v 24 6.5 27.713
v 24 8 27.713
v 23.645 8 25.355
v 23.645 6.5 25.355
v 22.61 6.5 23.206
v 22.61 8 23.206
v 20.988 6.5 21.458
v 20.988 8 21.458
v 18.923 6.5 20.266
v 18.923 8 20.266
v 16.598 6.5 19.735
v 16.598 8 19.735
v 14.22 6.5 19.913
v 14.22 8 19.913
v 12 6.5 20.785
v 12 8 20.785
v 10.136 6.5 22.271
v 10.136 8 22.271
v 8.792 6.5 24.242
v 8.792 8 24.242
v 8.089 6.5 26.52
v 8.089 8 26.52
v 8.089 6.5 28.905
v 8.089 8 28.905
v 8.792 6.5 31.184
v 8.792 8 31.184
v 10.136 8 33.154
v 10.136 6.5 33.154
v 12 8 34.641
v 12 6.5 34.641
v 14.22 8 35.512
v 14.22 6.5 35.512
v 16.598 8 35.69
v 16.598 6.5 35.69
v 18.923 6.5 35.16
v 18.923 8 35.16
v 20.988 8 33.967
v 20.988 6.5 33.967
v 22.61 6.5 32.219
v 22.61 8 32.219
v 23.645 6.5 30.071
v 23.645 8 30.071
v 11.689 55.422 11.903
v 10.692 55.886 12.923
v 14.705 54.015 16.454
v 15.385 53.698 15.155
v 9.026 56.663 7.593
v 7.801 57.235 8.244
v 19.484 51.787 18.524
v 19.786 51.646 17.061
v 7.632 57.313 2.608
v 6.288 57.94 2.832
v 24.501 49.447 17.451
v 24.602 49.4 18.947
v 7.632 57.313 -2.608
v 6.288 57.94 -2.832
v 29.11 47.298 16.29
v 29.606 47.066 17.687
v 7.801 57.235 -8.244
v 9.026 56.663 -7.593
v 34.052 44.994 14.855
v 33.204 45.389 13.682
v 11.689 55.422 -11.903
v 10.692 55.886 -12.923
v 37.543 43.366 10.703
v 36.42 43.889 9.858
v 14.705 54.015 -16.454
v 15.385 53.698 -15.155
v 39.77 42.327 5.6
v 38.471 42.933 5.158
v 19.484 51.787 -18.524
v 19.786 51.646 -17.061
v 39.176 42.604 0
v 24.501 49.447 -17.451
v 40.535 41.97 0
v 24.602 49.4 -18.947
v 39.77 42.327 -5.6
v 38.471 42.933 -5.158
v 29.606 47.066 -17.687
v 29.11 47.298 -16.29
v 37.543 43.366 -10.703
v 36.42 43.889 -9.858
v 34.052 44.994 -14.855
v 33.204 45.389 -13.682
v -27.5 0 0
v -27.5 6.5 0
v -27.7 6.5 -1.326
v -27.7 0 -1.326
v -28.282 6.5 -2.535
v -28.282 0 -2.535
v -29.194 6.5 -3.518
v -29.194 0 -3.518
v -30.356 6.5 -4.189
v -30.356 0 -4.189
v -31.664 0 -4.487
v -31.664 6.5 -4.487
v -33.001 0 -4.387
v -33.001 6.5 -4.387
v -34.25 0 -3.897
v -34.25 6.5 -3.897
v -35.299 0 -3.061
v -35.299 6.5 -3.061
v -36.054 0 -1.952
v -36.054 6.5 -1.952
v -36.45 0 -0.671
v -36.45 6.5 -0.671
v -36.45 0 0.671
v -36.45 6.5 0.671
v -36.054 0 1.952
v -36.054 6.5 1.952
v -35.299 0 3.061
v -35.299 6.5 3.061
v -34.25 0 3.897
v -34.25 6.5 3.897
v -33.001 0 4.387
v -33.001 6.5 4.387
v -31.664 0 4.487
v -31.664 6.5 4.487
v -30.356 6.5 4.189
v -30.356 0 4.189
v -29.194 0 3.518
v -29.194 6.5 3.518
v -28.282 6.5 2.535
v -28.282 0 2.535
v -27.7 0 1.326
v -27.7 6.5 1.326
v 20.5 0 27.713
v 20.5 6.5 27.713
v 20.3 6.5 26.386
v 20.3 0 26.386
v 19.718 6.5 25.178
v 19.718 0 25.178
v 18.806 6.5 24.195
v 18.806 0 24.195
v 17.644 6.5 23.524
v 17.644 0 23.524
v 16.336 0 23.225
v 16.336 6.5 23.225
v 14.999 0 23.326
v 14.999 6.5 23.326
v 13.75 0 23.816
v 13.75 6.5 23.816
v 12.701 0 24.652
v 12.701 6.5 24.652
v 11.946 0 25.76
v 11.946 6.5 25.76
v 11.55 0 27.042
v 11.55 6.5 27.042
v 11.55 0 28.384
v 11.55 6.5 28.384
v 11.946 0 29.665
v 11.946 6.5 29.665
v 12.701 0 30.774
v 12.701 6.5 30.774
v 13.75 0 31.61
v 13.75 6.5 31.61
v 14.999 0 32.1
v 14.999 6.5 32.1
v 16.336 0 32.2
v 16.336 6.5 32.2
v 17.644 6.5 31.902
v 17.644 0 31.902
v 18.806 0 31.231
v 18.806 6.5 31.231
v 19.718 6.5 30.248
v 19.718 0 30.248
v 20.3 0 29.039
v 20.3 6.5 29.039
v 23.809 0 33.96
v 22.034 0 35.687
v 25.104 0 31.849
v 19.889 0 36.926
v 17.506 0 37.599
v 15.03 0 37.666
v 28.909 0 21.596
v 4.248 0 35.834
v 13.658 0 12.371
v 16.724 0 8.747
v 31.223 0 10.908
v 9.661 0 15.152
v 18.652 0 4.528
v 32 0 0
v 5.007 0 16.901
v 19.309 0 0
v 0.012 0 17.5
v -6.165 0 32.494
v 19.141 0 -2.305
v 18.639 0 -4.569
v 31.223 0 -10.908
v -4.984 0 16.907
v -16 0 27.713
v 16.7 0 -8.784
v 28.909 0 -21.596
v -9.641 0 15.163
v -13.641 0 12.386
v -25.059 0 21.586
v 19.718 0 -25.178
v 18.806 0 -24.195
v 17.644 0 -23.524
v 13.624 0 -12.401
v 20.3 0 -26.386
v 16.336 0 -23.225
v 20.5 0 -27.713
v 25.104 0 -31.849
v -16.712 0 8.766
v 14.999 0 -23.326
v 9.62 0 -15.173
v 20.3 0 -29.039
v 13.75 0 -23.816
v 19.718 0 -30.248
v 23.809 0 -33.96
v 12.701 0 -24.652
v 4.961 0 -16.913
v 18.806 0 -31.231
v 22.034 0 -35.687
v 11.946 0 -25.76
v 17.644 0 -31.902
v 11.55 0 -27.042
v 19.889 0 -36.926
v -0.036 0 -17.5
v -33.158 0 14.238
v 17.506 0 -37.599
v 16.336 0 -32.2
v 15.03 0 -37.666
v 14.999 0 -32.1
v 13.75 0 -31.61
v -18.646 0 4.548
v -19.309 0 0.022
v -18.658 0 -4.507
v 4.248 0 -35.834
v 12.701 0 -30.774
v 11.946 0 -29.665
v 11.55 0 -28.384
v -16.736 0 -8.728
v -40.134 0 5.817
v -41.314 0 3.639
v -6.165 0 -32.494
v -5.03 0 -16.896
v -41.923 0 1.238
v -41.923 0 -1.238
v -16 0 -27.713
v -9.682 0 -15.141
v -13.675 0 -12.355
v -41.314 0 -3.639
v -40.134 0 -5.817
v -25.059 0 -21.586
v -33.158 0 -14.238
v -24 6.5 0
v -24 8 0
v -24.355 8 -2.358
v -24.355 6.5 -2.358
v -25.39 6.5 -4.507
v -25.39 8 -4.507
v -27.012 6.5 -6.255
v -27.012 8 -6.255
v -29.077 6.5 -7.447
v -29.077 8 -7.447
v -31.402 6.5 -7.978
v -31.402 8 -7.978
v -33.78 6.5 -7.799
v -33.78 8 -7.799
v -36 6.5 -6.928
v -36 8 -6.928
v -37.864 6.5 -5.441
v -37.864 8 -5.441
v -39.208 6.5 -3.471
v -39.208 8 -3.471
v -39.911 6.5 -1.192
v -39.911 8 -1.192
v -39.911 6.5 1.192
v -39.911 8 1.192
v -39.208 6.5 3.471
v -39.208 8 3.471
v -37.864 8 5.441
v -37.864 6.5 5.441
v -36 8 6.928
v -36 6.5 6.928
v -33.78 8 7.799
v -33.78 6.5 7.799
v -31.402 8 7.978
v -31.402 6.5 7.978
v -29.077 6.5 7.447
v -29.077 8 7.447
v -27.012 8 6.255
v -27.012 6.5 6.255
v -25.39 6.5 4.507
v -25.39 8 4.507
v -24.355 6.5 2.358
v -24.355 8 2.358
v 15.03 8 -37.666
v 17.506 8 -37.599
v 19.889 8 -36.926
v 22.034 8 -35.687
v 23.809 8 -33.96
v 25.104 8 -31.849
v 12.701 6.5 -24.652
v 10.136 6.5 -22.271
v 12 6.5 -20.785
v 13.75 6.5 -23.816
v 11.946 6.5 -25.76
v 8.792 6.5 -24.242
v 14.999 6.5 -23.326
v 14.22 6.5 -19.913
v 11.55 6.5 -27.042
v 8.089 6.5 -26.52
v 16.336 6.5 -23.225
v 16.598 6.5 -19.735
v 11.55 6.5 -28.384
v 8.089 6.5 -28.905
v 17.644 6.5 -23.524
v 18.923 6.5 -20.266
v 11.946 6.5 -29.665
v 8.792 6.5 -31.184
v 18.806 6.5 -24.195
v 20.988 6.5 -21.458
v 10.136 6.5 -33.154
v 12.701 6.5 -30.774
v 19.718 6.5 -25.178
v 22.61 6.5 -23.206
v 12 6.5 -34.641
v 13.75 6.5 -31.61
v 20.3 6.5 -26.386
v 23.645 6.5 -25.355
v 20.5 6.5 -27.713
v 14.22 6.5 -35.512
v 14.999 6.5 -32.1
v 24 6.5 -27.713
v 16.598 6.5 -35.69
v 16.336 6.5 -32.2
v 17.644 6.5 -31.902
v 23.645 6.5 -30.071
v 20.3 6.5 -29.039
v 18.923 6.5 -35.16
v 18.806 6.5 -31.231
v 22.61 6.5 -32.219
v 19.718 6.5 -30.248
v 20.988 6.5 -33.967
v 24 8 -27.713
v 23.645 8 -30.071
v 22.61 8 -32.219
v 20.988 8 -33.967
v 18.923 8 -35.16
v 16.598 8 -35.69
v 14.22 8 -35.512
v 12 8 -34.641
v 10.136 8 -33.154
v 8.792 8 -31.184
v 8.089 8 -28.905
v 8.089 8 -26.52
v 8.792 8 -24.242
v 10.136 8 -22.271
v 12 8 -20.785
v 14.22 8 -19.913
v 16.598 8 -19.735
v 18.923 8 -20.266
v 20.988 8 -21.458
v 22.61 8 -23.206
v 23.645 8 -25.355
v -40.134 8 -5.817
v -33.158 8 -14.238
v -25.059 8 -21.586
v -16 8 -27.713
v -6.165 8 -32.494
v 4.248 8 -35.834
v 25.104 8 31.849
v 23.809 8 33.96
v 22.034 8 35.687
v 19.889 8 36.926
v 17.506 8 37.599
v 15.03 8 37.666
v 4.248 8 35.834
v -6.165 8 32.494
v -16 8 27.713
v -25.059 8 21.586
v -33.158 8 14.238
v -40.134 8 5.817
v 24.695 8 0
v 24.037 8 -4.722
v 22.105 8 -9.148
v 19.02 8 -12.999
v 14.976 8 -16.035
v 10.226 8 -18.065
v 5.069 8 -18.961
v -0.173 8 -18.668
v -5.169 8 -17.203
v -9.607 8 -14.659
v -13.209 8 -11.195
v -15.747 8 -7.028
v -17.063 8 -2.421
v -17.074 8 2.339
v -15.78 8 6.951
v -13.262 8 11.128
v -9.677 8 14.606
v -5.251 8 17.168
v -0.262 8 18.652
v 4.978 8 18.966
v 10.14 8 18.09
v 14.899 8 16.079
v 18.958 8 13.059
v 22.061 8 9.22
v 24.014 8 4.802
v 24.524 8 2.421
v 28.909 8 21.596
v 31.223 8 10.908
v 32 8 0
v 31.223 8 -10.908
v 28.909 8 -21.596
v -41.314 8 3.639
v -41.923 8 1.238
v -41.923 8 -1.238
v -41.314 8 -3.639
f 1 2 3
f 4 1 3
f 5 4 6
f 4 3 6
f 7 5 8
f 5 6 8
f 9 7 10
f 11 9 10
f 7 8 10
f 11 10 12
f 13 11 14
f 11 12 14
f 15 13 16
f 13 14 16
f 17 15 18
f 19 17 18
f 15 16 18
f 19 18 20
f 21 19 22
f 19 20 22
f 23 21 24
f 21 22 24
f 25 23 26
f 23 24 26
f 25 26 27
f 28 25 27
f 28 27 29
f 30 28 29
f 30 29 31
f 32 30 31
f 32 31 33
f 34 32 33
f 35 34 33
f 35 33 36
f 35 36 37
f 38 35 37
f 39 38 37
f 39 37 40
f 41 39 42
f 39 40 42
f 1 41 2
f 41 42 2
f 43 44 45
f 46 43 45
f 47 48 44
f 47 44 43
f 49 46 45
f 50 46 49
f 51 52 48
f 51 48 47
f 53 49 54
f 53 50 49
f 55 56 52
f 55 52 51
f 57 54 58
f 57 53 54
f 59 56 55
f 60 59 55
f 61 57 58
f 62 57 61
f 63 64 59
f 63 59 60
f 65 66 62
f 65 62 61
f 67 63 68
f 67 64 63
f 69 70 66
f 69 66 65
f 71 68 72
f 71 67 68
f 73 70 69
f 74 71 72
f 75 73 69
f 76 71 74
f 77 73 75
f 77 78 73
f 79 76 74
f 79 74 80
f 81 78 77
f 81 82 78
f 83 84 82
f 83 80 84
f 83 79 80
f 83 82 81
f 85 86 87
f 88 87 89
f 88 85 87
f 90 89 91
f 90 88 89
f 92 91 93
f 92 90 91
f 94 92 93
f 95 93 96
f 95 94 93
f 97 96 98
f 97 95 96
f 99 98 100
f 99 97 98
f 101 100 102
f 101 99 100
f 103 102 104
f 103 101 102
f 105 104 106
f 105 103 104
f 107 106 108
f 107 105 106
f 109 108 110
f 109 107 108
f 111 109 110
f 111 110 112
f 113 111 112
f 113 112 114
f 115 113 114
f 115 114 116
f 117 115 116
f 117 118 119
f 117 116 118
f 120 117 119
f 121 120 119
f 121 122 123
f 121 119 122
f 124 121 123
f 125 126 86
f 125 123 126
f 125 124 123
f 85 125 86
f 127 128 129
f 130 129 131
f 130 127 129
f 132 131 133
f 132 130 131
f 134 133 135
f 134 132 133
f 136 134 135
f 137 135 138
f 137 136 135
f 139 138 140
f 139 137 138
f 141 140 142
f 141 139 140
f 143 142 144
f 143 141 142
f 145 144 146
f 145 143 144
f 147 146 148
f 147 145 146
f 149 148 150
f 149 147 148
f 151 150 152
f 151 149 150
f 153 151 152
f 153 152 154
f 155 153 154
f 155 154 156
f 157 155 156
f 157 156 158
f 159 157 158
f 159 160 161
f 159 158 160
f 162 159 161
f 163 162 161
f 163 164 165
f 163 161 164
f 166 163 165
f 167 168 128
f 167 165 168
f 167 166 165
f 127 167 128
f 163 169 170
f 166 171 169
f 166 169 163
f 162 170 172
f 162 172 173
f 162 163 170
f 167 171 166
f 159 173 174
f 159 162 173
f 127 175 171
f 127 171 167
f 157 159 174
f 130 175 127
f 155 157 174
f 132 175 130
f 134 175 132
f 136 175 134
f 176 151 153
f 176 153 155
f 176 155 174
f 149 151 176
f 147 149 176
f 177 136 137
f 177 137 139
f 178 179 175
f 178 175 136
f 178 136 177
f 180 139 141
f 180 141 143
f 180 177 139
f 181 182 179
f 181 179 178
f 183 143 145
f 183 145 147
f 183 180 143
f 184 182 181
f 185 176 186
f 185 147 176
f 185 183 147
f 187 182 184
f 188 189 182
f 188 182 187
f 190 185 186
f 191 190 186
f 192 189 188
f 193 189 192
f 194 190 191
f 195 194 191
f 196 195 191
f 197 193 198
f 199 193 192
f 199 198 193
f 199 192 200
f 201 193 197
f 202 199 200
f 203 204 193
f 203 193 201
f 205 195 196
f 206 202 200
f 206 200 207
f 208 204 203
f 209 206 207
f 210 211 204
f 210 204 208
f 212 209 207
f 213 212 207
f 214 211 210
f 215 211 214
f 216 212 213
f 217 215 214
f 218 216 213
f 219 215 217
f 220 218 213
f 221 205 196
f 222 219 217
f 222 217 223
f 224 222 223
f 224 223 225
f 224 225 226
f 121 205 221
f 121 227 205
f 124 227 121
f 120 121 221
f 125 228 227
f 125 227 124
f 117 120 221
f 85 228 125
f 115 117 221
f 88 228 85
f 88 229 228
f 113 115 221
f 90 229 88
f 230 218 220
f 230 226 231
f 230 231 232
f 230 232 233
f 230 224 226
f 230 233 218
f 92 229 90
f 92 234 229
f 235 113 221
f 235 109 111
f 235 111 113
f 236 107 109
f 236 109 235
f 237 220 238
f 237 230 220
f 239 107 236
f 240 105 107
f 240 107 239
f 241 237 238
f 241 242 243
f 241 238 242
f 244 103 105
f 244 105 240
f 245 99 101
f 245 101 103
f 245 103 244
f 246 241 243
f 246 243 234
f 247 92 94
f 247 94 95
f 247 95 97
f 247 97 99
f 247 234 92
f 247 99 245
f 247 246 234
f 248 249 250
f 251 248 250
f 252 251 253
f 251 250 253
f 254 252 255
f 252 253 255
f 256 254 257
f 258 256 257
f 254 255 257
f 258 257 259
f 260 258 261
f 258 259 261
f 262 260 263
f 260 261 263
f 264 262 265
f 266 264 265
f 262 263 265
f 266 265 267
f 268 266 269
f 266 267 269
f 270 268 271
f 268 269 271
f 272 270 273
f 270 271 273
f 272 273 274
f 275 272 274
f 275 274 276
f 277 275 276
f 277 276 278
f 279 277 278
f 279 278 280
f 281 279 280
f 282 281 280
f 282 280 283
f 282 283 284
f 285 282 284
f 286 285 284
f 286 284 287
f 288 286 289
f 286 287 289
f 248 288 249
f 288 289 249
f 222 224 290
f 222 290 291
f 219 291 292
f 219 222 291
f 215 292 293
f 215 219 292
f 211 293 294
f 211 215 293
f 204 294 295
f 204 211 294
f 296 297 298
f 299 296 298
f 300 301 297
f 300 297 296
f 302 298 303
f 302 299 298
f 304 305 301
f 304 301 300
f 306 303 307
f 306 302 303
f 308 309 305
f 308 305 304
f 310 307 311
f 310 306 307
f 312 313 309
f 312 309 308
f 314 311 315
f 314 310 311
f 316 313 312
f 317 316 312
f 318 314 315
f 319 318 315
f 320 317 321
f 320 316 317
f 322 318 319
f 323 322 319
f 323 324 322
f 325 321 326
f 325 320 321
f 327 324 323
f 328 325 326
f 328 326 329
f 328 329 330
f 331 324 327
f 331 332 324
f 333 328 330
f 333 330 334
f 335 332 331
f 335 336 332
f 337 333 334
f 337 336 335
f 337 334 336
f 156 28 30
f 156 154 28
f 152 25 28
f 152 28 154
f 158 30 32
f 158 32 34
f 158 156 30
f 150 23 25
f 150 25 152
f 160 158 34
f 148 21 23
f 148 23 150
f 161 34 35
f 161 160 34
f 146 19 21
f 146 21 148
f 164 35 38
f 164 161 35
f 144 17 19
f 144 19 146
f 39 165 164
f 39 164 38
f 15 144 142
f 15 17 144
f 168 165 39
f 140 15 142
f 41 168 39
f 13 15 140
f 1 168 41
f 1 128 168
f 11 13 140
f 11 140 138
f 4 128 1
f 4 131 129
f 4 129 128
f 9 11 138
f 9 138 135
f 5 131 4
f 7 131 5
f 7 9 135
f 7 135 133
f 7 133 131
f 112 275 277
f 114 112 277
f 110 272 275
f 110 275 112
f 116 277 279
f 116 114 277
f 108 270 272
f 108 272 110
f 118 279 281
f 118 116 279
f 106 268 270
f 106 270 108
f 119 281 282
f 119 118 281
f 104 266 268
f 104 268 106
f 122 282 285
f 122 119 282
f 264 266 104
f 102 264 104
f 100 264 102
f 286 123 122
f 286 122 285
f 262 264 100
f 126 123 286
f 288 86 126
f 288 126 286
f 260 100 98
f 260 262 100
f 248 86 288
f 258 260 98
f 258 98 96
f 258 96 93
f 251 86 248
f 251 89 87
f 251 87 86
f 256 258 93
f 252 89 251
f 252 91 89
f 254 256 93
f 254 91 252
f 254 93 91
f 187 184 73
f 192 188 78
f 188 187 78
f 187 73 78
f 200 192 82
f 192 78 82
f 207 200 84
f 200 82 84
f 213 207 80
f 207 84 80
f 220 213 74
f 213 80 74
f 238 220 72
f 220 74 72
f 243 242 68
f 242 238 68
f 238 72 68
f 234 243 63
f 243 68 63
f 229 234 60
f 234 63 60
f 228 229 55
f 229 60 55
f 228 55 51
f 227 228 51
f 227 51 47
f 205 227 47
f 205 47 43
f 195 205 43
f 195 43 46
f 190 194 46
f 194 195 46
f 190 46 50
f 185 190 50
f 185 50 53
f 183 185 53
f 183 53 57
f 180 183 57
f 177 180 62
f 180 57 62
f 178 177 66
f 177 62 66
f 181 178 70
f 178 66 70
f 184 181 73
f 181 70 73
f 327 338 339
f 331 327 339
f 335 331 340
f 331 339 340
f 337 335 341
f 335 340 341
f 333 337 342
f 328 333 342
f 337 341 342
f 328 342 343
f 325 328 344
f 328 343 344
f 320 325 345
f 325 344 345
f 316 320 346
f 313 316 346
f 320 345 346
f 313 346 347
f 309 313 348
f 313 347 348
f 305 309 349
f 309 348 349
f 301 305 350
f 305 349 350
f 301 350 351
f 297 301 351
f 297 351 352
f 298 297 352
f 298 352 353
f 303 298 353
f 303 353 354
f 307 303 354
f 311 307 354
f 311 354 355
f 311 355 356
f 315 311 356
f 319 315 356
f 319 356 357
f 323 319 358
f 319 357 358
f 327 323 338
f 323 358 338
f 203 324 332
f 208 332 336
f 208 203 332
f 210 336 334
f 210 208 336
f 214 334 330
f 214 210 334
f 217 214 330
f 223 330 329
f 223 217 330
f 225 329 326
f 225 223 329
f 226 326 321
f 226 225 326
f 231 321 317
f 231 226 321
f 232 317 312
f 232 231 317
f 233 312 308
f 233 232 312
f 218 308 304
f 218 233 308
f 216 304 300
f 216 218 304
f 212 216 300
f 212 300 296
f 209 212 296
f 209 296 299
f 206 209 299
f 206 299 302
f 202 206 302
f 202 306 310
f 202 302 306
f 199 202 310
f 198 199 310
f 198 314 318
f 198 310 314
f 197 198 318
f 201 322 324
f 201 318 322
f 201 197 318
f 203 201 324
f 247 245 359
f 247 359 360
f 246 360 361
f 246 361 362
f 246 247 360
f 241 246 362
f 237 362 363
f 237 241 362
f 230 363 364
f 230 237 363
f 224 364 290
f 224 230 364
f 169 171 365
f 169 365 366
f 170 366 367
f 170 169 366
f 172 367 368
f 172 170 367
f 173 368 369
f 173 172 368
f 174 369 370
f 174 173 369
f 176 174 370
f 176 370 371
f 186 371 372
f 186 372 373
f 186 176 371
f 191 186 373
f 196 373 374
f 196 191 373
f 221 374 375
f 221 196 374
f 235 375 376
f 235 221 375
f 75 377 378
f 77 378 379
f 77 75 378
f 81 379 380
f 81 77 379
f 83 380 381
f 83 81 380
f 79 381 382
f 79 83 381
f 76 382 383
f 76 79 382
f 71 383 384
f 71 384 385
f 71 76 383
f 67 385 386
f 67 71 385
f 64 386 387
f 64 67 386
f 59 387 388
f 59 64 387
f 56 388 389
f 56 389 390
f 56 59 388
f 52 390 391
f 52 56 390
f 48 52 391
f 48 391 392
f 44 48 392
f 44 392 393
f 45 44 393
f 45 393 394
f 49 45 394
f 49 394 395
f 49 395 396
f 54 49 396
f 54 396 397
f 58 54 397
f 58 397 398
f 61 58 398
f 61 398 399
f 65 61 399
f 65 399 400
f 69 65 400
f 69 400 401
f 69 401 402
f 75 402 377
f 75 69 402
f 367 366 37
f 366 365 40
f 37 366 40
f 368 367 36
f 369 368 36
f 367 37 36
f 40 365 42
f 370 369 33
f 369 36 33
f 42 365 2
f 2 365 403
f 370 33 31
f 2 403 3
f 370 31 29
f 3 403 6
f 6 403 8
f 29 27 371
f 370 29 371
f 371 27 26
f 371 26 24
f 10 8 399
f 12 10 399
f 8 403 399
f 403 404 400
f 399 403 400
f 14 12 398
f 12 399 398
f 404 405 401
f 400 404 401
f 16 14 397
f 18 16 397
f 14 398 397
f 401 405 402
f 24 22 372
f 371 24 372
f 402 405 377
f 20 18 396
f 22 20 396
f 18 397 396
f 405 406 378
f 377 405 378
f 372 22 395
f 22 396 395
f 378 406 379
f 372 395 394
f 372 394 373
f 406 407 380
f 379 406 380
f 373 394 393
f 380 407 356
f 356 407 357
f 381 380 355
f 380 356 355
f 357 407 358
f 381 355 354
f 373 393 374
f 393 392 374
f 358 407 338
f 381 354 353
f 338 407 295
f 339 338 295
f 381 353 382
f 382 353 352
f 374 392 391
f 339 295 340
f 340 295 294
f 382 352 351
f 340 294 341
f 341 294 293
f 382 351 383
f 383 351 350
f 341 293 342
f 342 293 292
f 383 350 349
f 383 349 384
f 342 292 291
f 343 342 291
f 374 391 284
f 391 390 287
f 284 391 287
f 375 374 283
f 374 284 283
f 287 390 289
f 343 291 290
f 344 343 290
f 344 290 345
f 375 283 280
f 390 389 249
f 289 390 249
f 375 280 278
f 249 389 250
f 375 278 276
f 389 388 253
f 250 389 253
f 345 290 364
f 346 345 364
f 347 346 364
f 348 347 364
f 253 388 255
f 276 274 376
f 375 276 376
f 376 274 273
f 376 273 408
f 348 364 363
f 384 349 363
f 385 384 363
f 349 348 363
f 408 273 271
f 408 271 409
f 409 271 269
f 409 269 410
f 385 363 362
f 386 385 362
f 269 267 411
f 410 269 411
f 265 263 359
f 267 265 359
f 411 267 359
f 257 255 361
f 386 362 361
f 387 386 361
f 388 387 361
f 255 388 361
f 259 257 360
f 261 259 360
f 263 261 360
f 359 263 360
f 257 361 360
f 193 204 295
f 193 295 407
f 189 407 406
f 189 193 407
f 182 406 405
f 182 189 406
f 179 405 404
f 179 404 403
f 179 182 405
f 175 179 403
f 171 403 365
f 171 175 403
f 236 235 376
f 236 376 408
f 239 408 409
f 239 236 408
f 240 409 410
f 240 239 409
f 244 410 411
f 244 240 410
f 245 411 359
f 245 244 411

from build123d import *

# Parameters (mm, degrees)
SKETCH_1_R          = 4.5
EXTRUDE_1_DEPTH     = 8
SKETCH_5_R          = 8
CUT_EXTRUDE_2_DEPTH = 1.5
EXTRUDE_3_REACH     = 74.919
SKETCH_4_R          = 19
SKETCH_4_3_R        = 17.5
CUT_EXTRUDE_3_DEPTH = 73.918862941


with BuildPart() as part:
    # 草圖1 → 填料-伸長1 (new body)
    with BuildSketch(Plane(origin=(0, 0, 0), x_dir=(1, 0, 0), z_dir=(0, 1, 0))):
        with BuildLine():
            ThreePointArc((-40.134328358, -5.816588533), (-42, 0), (-40.134328358, 5.816588533))
            ThreePointArc((-40.134328358, 5.816588533), (-16, 27.712812921), (15.029850746, 37.665642188))
            ThreePointArc((15.029850746, 37.665642188), (21, 36.373066959), (25.104477612, 31.849053656))
            ThreePointArc((25.104477612, 31.849053656), (32, 0), (25.104477612, -31.849053656))
            ThreePointArc((25.104477612, -31.849053656), (21, -36.373066959), (15.029850746, -37.665642188))
            ThreePointArc((15.029850746, -37.665642188), (-16, -27.712812921), (-40.134328358, -5.816588533))
        make_face()
        with Locations((-32, 0)):
            Circle(SKETCH_1_R, mode=Mode.SUBTRACT)
        with Locations((16, 27.712812921)):
            Circle(SKETCH_1_R, mode=Mode.SUBTRACT)
        with Locations((16, -27.712812921)):
            Circle(SKETCH_1_R, mode=Mode.SUBTRACT)
    extrude(amount=EXTRUDE_1_DEPTH)

    # 草圖5 → 除料-伸長2 (cut)
    with BuildSketch(Plane(origin=(0, 8, 0), x_dir=(1, 0, 0), z_dir=(0, 1, 0))):
        with Locations((-32, 0)):
            Circle(SKETCH_5_R)
        with Locations((16, 27.712812921)):
            Circle(SKETCH_5_R)
        with Locations((16, -27.712812921)):
            Circle(SKETCH_5_R)
    extrude(amount=-CUT_EXTRUDE_2_DEPTH, mode=Mode.SUBTRACT)

    # 填料-伸長3: up to this face of the body (flat: up to its plane)
    extrude_3_end = Plane(part.part.faces().sort_by_distance((0, 8, 0))[0])
    # 草圖4 → 填料-伸長3 (add, up to the picked face)
    with BuildSketch(Plane(origin=(23.315382908, 50, 0), x_dir=(0.906307787, -0.422618262, 0), z_dir=(0.422618262, 0.906307787, 0)), mode=Mode.PRIVATE) as extrude_3_sk1:
        Circle(SKETCH_4_R)
    extrude_3_tool1 = split(extrude(extrude_3_sk1.sketch, amount=-EXTRUDE_3_REACH, mode=Mode.PRIVATE), bisect_by=extrude_3_end, keep=Keep.BOTH, mode=Mode.PRIVATE)
    add(extrude_3_tool1.solids().sort_by_distance((23.315383, 50, 0))[0])

    # 草圖4<3> → 除料-伸長3 (cut, through all)
    with BuildSketch(Plane(origin=(23.315382908, 50, 0), x_dir=(0.906307787, -0.422618262, 0), z_dir=(0.422618262, 0.906307787, 0))):
        Circle(SKETCH_4_3_R)
    extrude(amount=-CUT_EXTRUDE_3_DEPTH, mode=Mode.SUBTRACT)


solid = part.part
